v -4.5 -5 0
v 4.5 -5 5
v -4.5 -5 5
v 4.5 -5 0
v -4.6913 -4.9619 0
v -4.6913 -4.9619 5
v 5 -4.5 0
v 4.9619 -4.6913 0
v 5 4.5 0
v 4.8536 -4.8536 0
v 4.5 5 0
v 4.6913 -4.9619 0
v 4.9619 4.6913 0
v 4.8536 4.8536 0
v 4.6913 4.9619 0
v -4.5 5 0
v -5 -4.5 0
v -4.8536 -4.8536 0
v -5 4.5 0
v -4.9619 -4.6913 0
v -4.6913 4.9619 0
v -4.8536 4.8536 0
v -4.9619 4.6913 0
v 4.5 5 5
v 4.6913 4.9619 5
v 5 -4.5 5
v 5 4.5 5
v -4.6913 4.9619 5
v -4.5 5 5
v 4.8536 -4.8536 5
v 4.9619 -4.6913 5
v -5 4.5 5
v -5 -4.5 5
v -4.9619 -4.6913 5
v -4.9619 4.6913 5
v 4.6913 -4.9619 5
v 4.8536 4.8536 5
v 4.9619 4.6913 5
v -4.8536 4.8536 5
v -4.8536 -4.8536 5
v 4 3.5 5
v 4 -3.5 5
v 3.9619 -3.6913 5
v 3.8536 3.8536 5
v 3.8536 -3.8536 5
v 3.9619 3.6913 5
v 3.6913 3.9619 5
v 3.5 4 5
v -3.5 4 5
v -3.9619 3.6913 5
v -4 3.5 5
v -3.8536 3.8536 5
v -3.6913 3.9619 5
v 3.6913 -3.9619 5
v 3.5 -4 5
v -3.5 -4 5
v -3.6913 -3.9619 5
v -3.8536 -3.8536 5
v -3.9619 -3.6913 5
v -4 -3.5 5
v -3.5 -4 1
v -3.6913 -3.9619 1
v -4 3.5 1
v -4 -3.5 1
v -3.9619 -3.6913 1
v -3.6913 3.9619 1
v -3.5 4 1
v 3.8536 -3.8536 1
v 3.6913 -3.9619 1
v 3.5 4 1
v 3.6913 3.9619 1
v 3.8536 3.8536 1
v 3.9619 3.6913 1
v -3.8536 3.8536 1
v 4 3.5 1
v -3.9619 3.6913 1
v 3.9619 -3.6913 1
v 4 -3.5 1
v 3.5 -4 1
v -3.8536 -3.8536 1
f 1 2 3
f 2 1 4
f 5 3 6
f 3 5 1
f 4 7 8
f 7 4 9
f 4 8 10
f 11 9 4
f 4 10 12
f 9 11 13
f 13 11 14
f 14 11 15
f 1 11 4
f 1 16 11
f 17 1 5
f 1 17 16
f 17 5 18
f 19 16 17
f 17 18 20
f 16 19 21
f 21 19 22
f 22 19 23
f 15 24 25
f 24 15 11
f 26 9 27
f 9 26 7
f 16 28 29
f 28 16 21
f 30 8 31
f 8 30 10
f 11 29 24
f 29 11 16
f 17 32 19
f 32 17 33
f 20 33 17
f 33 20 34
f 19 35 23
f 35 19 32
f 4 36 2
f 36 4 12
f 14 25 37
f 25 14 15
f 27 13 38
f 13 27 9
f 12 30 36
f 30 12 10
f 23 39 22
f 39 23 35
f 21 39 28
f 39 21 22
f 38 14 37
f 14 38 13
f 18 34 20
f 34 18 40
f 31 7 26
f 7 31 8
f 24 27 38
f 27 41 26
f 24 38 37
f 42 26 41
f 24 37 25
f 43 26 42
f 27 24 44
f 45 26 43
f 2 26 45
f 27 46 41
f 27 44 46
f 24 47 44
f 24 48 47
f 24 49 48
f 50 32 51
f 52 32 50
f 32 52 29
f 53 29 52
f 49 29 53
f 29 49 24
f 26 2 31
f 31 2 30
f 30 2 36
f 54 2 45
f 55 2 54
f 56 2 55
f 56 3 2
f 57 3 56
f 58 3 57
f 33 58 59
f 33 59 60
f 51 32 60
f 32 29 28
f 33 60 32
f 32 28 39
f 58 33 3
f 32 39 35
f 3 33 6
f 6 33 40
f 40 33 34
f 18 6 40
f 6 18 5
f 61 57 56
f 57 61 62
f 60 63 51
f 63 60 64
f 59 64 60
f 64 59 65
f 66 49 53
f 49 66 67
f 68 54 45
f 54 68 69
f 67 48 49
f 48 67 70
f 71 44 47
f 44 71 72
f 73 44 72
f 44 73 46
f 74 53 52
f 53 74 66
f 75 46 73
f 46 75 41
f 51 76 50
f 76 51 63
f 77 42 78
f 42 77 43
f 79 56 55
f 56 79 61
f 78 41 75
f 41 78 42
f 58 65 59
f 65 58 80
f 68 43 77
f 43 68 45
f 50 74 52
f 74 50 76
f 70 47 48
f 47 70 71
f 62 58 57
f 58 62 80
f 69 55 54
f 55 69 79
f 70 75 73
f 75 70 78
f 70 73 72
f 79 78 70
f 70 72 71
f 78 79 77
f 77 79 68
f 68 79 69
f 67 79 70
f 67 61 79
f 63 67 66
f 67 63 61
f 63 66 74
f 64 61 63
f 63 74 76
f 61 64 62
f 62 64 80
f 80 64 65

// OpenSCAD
//------------------------------------------------------------------------------------------
// THIS CODE WAS GENERATED WITH GRAPHSCAD
//------------------------------------------------------------------------------------------
// Graphscad is a graphical nodal editor to create .SCAD files
//
// More info : http://graphscad.free.fr
//
// Scad Files created with Graphscad can be edited by graphscad
// Scad Files created with Graphscad can be read by Openscad
//
//------------------------------------------------------------------------------------------
module demobox()
{
 function node_box_matrix(i=0,j=0,k=0,l=0,m=0,n=0) = translate([0,0,0]);
 module node_box(i=0,j=0,k=0,l=0,m=0,n=0)
 {
  difference()
  {
   hull()
   {
    translate([-((((10)/2))-(0.5)),-((((10)/2))-(0.5)),0]) cylinder(r=0.5,h=(5),$fn=16);
    translate([-((((10)/2))-(0.5)), ((((10)/2))-(0.5)),0]) cylinder(r=0.5,h=(5),$fn=16);
    translate([ ((((10)/2))-(0.5)),-((((10)/2))-(0.5)),0]) cylinder(r=0.5,h=(5),$fn=16);
    translate([ ((((10)/2))-(0.5)), ((((10)/2))-(0.5)),0]) cylinder(r=0.5,h=(5),$fn=16);
   }
   translate([ 0,0,1])hull()
   {
    translate([-((((10)/2))-((0.5)+(1))),-((((10)/2))-((0.5)+(1))),0]) cylinder(r=0.5,h=(((5))-(1)+0.01),$fn=16);
    translate([-((((10)/2))-((0.5)+(1))), ((((10)/2))-((0.5)+(1))),0]) cylinder(r=0.5,h=(((5))-(1)+0.01),$fn=16);
    translate([ ((((10)/2))-((0.5)+(1))),-((((10)/2))-((0.5)+(1))),0]) cylinder(r=0.5,h=(((5))-(1)+0.01),$fn=16);
    translate([ ((((10)/2))-((0.5)+(1))), ((((10)/2))-((0.5)+(1))),0]) cylinder(r=0.5,h=(((5))-(1)+0.01),$fn=16);
   }
  }
 }
 node_box();
 /*--------------------------------------------------------------------------------------------------------
  Graphscad Utils functions
  This code is Used By Graphscad Nodal Editor to generate SCAD files
 --------------------------------------------------------------------------------------------------------*/
 function det4x4(a) =
 a[0][0]*a[1][1]*a[2][2]*a[3][3] + a[0][0]*a[1][2]*a[2][3]*a[3][1] + a[0][0]*a[1][3]*a[2][1]*a[3][2]
 + a[0][1]*a[1][0]*a[2][3]*a[3][2] + a[0][1]*a[1][2]*a[2][0]*a[3][3] + a[0][1]*a[1][3]*a[2][2]*a[3][0]
 + a[0][2]*a[1][0]*a[2][1]*a[3][3] + a[0][2]*a[1][1]*a[2][3]*a[3][0] + a[0][2]*a[1][3]*a[2][0]*a[3][1]
 + a[0][3]*a[1][0]*a[2][2]*a[3][1] + a[0][3]*a[1][1]*a[2][0]*a[3][2] + a[0][3]*a[1][2]*a[2][1]*a[3][0]
 - a[0][0]*a[1][1]*a[2][3]*a[3][2] - a[0][0]*a[1][2]*a[2][1]*a[3][3] - a[0][0]*a[1][3]*a[2][2]*a[3][1]
 - a[0][1]*a[1][0]*a[2][2]*a[3][3] - a[0][1]*a[1][2]*a[2][3]*a[3][0] - a[0][1]*a[1][3]*a[2][0]*a[3][2]
 - a[0][2]*a[1][0]*a[2][3]*a[3][1] - a[0][2]*a[1][1]*a[2][0]*a[3][3] - a[0][2]*a[1][3]*a[2][1]*a[3][0]
 - a[0][3]*a[1][0]*a[2][1]*a[3][2] - a[0][3]*a[1][1]*a[2][2]*a[3][0] - a[0][3]*a[1][2]*a[2][0]*a[3][1];
 function invb00(a) = a[1][1]*a[2][2]*a[3][3] + a[1][2]*a[2][3]*a[3][1] + a[1][3]*a[2][1]*a[3][2] - a[1][1]*a[2][3]*a[3][2] - a[1][2]*a[2][1]*a[3][3] - a[1][3]*a[2][2]*a[3][1];
 function invb01(a) = a[0][1]*a[2][3]*a[3][2] + a[0][2]*a[2][1]*a[3][3] + a[0][3]*a[2][2]*a[3][1] - a[0][1]*a[2][2]*a[3][3] - a[0][2]*a[2][3]*a[3][1] - a[0][3]*a[2][1]*a[3][2];
 function invb02(a) = a[0][1]*a[1][2]*a[3][3] + a[0][2]*a[1][3]*a[3][1] + a[0][3]*a[1][1]*a[3][2] - a[0][1]*a[1][3]*a[3][2] - a[0][2]*a[1][1]*a[3][3] - a[0][3]*a[1][2]*a[3][1];
 function invb03(a) = a[0][1]*a[1][3]*a[2][2] + a[0][2]*a[1][1]*a[2][3] + a[0][3]*a[1][2]*a[2][1] - a[0][1]*a[1][2]*a[2][3] - a[0][2]*a[1][3]*a[2][1] - a[0][3]*a[1][1]*a[2][2];
 function invb10(a) = a[1][0]*a[2][3]*a[3][2] + a[1][2]*a[2][0]*a[3][3] + a[1][3]*a[2][2]*a[3][0] - a[1][0]*a[2][2]*a[3][3] - a[1][2]*a[2][3]*a[3][0] - a[1][3]*a[2][0]*a[3][2];
 function invb11(a) = a[0][0]*a[2][2]*a[3][3] + a[0][2]*a[2][3]*a[3][0] + a[0][3]*a[2][0]*a[3][2] - a[0][0]*a[2][3]*a[3][2] - a[0][2]*a[2][0]*a[3][3] - a[0][3]*a[2][2]*a[3][0];
 function invb12(a) = a[0][0]*a[1][3]*a[3][2] + a[0][2]*a[1][0]*a[3][3] + a[0][3]*a[1][2]*a[3][0] - a[0][0]*a[1][2]*a[3][3] - a[0][2]*a[1][3]*a[3][0] - a[0][3]*a[1][0]*a[3][2];
 function invb13(a) = a[0][0]*a[1][2]*a[2][3] + a[0][2]*a[1][3]*a[2][0] + a[0][3]*a[1][0]*a[2][2] - a[0][0]*a[1][3]*a[2][2] - a[0][2]*a[1][0]*a[2][3] - a[0][3]*a[1][2]*a[2][0];
 function invb20(a) = a[1][0]*a[2][1]*a[3][3] + a[1][1]*a[2][3]*a[3][0] + a[1][3]*a[2][0]*a[3][1] - a[1][0]*a[2][3]*a[3][1] - a[1][1]*a[2][0]*a[3][3] - a[1][3]*a[2][1]*a[3][0];
 function invb21(a) = a[0][0]*a[2][3]*a[3][1] + a[0][1]*a[2][0]*a[3][3] + a[0][3]*a[2][1]*a[3][0] - a[0][0]*a[2][1]*a[3][3] - a[0][1]*a[2][3]*a[3][0] - a[0][3]*a[2][0]*a[3][1];
 function invb22(a) = a[0][0]*a[1][1]*a[3][3] + a[0][1]*a[1][3]*a[3][0] + a[0][3]*a[1][0]*a[3][1] - a[0][0]*a[1][3]*a[3][1] - a[0][1]*a[1][0]*a[3][3] - a[0][3]*a[1][1]*a[3][0];
 function invb23(a) = a[0][0]*a[1][3]*a[2][1] + a[0][1]*a[1][0]*a[2][3] + a[0][3]*a[1][1]*a[2][0] - a[0][0]*a[1][1]*a[2][3] - a[0][1]*a[1][3]*a[2][0] - a[0][3]*a[1][0]*a[2][1];
 function invb30(a) = a[1][0]*a[2][2]*a[3][1] + a[1][1]*a[2][0]*a[3][2] + a[1][2]*a[2][1]*a[3][0] - a[1][0]*a[2][1]*a[3][2] - a[1][1]*a[2][2]*a[3][0] - a[1][2]*a[2][0]*a[3][1];
 function invb31(a) = a[0][0]*a[2][1]*a[3][2] + a[0][1]*a[2][2]*a[3][0] + a[0][2]*a[2][0]*a[3][1] - a[0][0]*a[2][2]*a[3][1] - a[0][1]*a[2][0]*a[3][2] - a[0][2]*a[2][1]*a[3][0];
 function invb32(a) = a[0][0]*a[1][2]*a[3][1] + a[0][1]*a[1][0]*a[3][2] + a[0][2]*a[1][1]*a[3][0] - a[0][0]*a[1][1]*a[3][2] - a[0][1]*a[1][2]*a[3][0] - a[0][2]*a[1][0]*a[3][1];
 function invb33(a) = a[0][0]*a[1][1]*a[2][2] + a[0][1]*a[1][2]*a[2][0] + a[0][2]*a[1][0]*a[2][1] - a[0][0]*a[1][2]*a[2][1] - a[0][1]*a[1][0]*a[2][2] - a[0][2]*a[1][1]*a[2][0];
 function inv4x4(a)= (1/det4x4(a))*[
 [invb00(a),invb01(a),invb02(a),invb03(a)],
 [invb10(a),invb11(a),invb12(a),invb13(a)],
 [invb20(a),invb21(a),invb22(a),invb23(a)],
 [invb30(a),invb31(a),invb32(a),invb33(a)]];
 function onlytranslate(a)=  [
                        [1,0,0,a[0][3]],
                        [0,1,0,a[1][3]],
                        [0,0,1,a[2][3]],
                        [0,0,0,1]];
 function negonlytranslate(a)=[
                        [1,0,0,-a[0][3]],
                        [0,1,0,-a[1][3]],
                        [0,0,1,-a[2][3]],
                        [0,0,0,1]];
 function lookatvec(t,parentmat) = [t[0]-parentmat[0][3],
                                 t[1]-parentmat[1][3],
                                 t[2]-parentmat[2][3]];
 /*
              rx = '0'
              ry = 'acos('+tz+'/norm(['+tx+','+ty+','+tz+']))'
              rz = 'atan2('+ty+','+tx+')'
 */
 function lookatrot(t,parentmat) = [0,
                                 acos((t[2]-parentmat[2][3])/norm(lookatvec(t,parentmat))),
                                 atan2(t[1]-parentmat[1][3],t[0]-parentmat[0][3])];
 function gettranslation(m) = [m[0][3],m[1][3],m[2][3]];
 function vectormulmatrix(v,m) = m*v;
 function vectorlength(v) = norm(v);
 function vectorx(v) = v[0];
 function vectory(v) = v[1];
 function vectorz(v) = v[2];
 function vectoradd(a,b) = (a+b);
 function vectorsub(a,b) = (a-b);
 function vectormul(a,b) = (a*b);
 function vectordiv(a,b) = (a*(1/b));
 function scale(v)=[[v[0],0,0,0],
                    [0,v[1],0,0],
                    [0,0,v[2],0],
                    [0,0,0,1]];
 function rotatex(a)=[[1,0,0,0],
                      [0,cos(a),-sin(a),0],
                      [0,sin(a),cos(a),0],
                      [0,0,0,1]];
 function rotatey(a)=[[cos(a),0,sin(a),0],
                      [0,1,0,0],
                      [-sin(a),0,cos(a),0],
                      [0,0,0,1]];
 function rotatez(a)=[[cos(a),-sin(a),0,0],
                      [sin(a),cos(a),0,0],
                      [0,0,1,0],
                      [0,0,0,1]];
 function rotatea(c,s,l,m,n)=[[l*l*(1-c)+c,m*l*(1-c)-n*s,n*l*(1-c)+m*s,0],
                              [l*m*(1-c)+n*s,m*m*(1-c)+c,n*m*(1-c)-l*s,0],
                              [l*n*(1-c)-m*s,m*n*(1-c)+l*s,n*n*(1-c)+c,0],
                              [0,0,0,1]];
 function rotateanv(a,nv)=rotatea(cos(a),sin(a),nv[0],nv[1],nv[2]);
 function rotate(a,v, normV=true)=(v==undef)?rotatez(a[2])*rotatey(a[1])*rotatex(a[0]):
                      normV ? rotateanv(a,v/sqrt(v*v)) : rotateanv(a,v);
 function translate(v)=[[1,0,0,v[0]],
                        [0,1,0,v[1]],
                        [0,0,1,v[2]],
                        [0,0,0,1]];
 function mirrorabc(a,b,c)=[[1-2*a*a,-2*a*b,-2*a*c,0],
                            [-2*a*b,1-2*b*b,-2*b*c,0],
                            [-2*a*c,-2*b*c,1-2*c*c,0],
                            [0,0,0,1]];
 function mirrornv(nv)=mirrorabc(nv[0],nv[1],nv[2]);
 function mirror(v)=mirrornv(v/sqrt(v*v));
}
demobox();


/*BEGINGRAPHSCAD
{
    "nodes": [
        {
            "name": "node_box",
            "inputplugs": [
                {
                    "type": "str",
                    "name": "sizex",
                    "value": "10"
                },
                {
                    "type": "str",
                    "name": "sizey",
                    "value": "10"
                },
                {
                    "type": "str",
                    "name": "sizez",
                    "value": "5"
                },
                {
                    "type": "str",
                    "name": "tx",
                    "value": "0"
                },
                {
                    "type": "str",
                    "name": "ty",
                    "value": "0"
                },
                {
                    "type": "str",
                    "name": "tz",
                    "value": "0"
                },
                {
                    "type": "str",
                    "name": "rounding",
                    "value": "0.5"
                },
                {
                    "type": "str",
                    "name": "tickness",
                    "value": "1"
                },
                {
                    "type": "str",
                    "name": "interiorheight",
                    "value": "1"
                },
                {
                    "type": "str",
                    "name": "$fn",
                    "value": "16"
                },
                {
                    "type": "str",
                    "name": "center",
                    "value": "true",
                    "combo": [
                        "true",
                        "false"
                    ]
                }
            ],
            "typename": "Node_box",
            "version": 1,
            "y": -198.09734386230485,
            "x": -336.16889159179664
        }
    ],
    "version": 2
}
ENDGRAPHSCAD*/
